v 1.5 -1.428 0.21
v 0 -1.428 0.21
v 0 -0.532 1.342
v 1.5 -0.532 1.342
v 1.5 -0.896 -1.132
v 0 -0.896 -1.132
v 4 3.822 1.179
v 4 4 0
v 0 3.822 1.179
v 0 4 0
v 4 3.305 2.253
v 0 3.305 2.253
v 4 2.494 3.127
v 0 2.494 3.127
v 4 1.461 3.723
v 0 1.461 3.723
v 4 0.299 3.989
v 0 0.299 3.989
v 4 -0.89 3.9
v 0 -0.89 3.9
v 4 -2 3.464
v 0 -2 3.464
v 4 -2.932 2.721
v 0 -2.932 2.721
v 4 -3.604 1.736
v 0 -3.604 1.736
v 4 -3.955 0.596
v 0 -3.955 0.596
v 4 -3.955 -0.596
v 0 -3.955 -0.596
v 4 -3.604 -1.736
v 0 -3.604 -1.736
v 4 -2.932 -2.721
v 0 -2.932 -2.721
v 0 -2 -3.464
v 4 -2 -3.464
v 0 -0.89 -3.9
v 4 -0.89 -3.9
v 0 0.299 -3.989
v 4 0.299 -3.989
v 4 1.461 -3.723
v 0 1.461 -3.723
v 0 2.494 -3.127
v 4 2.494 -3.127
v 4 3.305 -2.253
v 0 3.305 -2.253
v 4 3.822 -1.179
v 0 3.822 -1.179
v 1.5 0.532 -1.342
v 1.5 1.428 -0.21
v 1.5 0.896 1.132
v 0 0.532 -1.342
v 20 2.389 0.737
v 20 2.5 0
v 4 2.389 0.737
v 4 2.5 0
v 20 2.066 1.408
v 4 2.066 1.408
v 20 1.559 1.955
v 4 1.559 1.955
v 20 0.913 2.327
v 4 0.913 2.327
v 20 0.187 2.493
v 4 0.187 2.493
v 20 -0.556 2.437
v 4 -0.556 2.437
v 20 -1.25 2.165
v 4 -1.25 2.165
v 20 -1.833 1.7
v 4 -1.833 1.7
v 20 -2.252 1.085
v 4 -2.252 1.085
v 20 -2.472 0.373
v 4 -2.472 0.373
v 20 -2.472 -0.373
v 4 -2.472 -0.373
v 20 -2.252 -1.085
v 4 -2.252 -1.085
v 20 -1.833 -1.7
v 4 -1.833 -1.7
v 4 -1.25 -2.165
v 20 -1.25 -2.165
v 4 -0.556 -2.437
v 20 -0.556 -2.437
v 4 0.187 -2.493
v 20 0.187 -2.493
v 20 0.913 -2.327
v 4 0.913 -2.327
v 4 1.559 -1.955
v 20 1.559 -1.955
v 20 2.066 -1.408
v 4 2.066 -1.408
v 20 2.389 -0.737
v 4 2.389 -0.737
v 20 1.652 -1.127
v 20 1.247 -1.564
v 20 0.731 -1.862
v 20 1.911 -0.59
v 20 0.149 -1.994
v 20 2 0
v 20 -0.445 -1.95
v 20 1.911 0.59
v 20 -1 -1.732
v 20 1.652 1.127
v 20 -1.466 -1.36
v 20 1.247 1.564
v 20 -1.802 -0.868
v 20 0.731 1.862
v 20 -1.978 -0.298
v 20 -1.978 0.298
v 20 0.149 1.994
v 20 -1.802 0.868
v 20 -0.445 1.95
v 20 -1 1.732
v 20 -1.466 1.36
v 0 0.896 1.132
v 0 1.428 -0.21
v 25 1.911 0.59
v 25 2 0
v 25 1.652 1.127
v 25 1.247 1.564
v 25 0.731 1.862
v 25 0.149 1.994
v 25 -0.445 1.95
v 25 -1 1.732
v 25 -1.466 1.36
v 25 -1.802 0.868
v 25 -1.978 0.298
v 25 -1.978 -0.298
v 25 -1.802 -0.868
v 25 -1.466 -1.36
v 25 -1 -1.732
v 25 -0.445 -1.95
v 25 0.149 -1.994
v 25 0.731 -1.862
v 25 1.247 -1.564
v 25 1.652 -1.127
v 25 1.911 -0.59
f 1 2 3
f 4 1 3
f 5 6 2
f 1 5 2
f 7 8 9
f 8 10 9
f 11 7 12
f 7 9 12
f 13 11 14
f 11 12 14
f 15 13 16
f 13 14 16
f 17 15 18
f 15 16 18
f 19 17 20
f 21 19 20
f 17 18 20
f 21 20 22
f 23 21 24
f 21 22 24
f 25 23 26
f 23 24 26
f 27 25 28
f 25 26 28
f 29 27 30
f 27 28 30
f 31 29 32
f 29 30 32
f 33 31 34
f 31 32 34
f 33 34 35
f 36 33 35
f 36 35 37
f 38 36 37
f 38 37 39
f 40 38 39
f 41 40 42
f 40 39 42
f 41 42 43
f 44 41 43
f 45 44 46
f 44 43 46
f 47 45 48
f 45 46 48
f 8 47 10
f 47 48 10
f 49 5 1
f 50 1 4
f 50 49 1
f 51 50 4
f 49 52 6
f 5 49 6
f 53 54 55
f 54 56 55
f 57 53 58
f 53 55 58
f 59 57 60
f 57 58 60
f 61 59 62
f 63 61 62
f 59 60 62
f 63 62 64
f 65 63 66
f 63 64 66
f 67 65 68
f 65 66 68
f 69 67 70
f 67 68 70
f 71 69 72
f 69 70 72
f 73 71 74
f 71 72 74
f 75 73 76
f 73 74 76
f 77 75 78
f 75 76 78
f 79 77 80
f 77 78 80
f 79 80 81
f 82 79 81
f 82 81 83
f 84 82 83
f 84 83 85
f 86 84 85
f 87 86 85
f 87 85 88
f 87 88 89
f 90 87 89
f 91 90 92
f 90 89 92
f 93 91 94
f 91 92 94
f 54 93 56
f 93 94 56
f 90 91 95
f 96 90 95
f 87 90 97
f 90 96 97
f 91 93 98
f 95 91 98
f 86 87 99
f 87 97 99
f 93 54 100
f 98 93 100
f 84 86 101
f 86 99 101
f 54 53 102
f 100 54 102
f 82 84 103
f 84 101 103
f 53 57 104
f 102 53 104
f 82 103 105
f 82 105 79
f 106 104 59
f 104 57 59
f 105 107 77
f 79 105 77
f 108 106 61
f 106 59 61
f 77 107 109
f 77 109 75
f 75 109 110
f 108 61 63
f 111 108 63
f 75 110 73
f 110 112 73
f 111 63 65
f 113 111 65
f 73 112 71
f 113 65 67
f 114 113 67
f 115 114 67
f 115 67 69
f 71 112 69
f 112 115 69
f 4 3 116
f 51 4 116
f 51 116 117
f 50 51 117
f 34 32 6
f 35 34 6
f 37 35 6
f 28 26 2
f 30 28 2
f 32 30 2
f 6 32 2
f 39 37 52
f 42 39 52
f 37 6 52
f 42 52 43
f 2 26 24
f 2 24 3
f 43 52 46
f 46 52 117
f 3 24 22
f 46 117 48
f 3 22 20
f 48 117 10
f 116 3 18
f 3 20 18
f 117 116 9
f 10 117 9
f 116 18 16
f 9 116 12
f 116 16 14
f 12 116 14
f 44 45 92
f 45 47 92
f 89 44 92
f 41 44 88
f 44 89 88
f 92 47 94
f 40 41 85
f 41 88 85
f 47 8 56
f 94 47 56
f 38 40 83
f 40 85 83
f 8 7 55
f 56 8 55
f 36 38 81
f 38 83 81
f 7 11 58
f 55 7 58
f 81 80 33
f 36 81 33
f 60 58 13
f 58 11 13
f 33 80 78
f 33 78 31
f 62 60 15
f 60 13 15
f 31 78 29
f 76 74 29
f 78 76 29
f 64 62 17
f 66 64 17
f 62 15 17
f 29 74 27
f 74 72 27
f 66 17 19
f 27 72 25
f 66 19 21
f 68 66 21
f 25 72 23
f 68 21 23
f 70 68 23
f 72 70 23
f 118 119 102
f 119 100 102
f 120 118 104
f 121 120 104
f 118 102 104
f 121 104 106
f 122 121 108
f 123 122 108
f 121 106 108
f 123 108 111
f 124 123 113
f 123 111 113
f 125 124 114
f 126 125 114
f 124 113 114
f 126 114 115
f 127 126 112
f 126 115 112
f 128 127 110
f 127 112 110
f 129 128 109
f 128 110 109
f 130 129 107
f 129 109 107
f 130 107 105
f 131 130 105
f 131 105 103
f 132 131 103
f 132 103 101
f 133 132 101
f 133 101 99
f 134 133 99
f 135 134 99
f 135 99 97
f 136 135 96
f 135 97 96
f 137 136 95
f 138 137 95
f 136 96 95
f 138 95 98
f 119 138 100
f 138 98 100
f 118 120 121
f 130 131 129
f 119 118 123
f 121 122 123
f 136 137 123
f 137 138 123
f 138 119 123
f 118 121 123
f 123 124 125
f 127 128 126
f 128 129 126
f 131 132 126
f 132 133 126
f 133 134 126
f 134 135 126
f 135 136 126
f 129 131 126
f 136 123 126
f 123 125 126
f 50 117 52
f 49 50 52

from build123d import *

# Parameters (mm, degrees)
CUT_EXTRUDE1_DEPTH = 1.5


with BuildPart() as part:
    # Sketch1 → Revolve1 (revolve)
    with BuildSketch(Plane.XY):
        Polygon((0, 0), (25, 0), (25, 2), (20, 2), (20, 2.5), (4, 2.5), (4, 4), (0, 4), align=None)
    revolve(axis=Axis((0, 0, 0), (1, 0, 0)))

    # Sketch2 → Cut-Extrude1 (cut)
    with BuildSketch(Plane.ZY):
        Polygon((-0.209897737, 1.428032308), (-1.341661125, 0.532239381), (-1.131763388, -0.895792927), (0.209897737, -1.428032308), (1.341661125, -0.532239381), (1.131763388, 0.895792927), align=None)
    extrude(amount=-CUT_EXTRUDE1_DEPTH, mode=Mode.SUBTRACT)


solid = part.part
